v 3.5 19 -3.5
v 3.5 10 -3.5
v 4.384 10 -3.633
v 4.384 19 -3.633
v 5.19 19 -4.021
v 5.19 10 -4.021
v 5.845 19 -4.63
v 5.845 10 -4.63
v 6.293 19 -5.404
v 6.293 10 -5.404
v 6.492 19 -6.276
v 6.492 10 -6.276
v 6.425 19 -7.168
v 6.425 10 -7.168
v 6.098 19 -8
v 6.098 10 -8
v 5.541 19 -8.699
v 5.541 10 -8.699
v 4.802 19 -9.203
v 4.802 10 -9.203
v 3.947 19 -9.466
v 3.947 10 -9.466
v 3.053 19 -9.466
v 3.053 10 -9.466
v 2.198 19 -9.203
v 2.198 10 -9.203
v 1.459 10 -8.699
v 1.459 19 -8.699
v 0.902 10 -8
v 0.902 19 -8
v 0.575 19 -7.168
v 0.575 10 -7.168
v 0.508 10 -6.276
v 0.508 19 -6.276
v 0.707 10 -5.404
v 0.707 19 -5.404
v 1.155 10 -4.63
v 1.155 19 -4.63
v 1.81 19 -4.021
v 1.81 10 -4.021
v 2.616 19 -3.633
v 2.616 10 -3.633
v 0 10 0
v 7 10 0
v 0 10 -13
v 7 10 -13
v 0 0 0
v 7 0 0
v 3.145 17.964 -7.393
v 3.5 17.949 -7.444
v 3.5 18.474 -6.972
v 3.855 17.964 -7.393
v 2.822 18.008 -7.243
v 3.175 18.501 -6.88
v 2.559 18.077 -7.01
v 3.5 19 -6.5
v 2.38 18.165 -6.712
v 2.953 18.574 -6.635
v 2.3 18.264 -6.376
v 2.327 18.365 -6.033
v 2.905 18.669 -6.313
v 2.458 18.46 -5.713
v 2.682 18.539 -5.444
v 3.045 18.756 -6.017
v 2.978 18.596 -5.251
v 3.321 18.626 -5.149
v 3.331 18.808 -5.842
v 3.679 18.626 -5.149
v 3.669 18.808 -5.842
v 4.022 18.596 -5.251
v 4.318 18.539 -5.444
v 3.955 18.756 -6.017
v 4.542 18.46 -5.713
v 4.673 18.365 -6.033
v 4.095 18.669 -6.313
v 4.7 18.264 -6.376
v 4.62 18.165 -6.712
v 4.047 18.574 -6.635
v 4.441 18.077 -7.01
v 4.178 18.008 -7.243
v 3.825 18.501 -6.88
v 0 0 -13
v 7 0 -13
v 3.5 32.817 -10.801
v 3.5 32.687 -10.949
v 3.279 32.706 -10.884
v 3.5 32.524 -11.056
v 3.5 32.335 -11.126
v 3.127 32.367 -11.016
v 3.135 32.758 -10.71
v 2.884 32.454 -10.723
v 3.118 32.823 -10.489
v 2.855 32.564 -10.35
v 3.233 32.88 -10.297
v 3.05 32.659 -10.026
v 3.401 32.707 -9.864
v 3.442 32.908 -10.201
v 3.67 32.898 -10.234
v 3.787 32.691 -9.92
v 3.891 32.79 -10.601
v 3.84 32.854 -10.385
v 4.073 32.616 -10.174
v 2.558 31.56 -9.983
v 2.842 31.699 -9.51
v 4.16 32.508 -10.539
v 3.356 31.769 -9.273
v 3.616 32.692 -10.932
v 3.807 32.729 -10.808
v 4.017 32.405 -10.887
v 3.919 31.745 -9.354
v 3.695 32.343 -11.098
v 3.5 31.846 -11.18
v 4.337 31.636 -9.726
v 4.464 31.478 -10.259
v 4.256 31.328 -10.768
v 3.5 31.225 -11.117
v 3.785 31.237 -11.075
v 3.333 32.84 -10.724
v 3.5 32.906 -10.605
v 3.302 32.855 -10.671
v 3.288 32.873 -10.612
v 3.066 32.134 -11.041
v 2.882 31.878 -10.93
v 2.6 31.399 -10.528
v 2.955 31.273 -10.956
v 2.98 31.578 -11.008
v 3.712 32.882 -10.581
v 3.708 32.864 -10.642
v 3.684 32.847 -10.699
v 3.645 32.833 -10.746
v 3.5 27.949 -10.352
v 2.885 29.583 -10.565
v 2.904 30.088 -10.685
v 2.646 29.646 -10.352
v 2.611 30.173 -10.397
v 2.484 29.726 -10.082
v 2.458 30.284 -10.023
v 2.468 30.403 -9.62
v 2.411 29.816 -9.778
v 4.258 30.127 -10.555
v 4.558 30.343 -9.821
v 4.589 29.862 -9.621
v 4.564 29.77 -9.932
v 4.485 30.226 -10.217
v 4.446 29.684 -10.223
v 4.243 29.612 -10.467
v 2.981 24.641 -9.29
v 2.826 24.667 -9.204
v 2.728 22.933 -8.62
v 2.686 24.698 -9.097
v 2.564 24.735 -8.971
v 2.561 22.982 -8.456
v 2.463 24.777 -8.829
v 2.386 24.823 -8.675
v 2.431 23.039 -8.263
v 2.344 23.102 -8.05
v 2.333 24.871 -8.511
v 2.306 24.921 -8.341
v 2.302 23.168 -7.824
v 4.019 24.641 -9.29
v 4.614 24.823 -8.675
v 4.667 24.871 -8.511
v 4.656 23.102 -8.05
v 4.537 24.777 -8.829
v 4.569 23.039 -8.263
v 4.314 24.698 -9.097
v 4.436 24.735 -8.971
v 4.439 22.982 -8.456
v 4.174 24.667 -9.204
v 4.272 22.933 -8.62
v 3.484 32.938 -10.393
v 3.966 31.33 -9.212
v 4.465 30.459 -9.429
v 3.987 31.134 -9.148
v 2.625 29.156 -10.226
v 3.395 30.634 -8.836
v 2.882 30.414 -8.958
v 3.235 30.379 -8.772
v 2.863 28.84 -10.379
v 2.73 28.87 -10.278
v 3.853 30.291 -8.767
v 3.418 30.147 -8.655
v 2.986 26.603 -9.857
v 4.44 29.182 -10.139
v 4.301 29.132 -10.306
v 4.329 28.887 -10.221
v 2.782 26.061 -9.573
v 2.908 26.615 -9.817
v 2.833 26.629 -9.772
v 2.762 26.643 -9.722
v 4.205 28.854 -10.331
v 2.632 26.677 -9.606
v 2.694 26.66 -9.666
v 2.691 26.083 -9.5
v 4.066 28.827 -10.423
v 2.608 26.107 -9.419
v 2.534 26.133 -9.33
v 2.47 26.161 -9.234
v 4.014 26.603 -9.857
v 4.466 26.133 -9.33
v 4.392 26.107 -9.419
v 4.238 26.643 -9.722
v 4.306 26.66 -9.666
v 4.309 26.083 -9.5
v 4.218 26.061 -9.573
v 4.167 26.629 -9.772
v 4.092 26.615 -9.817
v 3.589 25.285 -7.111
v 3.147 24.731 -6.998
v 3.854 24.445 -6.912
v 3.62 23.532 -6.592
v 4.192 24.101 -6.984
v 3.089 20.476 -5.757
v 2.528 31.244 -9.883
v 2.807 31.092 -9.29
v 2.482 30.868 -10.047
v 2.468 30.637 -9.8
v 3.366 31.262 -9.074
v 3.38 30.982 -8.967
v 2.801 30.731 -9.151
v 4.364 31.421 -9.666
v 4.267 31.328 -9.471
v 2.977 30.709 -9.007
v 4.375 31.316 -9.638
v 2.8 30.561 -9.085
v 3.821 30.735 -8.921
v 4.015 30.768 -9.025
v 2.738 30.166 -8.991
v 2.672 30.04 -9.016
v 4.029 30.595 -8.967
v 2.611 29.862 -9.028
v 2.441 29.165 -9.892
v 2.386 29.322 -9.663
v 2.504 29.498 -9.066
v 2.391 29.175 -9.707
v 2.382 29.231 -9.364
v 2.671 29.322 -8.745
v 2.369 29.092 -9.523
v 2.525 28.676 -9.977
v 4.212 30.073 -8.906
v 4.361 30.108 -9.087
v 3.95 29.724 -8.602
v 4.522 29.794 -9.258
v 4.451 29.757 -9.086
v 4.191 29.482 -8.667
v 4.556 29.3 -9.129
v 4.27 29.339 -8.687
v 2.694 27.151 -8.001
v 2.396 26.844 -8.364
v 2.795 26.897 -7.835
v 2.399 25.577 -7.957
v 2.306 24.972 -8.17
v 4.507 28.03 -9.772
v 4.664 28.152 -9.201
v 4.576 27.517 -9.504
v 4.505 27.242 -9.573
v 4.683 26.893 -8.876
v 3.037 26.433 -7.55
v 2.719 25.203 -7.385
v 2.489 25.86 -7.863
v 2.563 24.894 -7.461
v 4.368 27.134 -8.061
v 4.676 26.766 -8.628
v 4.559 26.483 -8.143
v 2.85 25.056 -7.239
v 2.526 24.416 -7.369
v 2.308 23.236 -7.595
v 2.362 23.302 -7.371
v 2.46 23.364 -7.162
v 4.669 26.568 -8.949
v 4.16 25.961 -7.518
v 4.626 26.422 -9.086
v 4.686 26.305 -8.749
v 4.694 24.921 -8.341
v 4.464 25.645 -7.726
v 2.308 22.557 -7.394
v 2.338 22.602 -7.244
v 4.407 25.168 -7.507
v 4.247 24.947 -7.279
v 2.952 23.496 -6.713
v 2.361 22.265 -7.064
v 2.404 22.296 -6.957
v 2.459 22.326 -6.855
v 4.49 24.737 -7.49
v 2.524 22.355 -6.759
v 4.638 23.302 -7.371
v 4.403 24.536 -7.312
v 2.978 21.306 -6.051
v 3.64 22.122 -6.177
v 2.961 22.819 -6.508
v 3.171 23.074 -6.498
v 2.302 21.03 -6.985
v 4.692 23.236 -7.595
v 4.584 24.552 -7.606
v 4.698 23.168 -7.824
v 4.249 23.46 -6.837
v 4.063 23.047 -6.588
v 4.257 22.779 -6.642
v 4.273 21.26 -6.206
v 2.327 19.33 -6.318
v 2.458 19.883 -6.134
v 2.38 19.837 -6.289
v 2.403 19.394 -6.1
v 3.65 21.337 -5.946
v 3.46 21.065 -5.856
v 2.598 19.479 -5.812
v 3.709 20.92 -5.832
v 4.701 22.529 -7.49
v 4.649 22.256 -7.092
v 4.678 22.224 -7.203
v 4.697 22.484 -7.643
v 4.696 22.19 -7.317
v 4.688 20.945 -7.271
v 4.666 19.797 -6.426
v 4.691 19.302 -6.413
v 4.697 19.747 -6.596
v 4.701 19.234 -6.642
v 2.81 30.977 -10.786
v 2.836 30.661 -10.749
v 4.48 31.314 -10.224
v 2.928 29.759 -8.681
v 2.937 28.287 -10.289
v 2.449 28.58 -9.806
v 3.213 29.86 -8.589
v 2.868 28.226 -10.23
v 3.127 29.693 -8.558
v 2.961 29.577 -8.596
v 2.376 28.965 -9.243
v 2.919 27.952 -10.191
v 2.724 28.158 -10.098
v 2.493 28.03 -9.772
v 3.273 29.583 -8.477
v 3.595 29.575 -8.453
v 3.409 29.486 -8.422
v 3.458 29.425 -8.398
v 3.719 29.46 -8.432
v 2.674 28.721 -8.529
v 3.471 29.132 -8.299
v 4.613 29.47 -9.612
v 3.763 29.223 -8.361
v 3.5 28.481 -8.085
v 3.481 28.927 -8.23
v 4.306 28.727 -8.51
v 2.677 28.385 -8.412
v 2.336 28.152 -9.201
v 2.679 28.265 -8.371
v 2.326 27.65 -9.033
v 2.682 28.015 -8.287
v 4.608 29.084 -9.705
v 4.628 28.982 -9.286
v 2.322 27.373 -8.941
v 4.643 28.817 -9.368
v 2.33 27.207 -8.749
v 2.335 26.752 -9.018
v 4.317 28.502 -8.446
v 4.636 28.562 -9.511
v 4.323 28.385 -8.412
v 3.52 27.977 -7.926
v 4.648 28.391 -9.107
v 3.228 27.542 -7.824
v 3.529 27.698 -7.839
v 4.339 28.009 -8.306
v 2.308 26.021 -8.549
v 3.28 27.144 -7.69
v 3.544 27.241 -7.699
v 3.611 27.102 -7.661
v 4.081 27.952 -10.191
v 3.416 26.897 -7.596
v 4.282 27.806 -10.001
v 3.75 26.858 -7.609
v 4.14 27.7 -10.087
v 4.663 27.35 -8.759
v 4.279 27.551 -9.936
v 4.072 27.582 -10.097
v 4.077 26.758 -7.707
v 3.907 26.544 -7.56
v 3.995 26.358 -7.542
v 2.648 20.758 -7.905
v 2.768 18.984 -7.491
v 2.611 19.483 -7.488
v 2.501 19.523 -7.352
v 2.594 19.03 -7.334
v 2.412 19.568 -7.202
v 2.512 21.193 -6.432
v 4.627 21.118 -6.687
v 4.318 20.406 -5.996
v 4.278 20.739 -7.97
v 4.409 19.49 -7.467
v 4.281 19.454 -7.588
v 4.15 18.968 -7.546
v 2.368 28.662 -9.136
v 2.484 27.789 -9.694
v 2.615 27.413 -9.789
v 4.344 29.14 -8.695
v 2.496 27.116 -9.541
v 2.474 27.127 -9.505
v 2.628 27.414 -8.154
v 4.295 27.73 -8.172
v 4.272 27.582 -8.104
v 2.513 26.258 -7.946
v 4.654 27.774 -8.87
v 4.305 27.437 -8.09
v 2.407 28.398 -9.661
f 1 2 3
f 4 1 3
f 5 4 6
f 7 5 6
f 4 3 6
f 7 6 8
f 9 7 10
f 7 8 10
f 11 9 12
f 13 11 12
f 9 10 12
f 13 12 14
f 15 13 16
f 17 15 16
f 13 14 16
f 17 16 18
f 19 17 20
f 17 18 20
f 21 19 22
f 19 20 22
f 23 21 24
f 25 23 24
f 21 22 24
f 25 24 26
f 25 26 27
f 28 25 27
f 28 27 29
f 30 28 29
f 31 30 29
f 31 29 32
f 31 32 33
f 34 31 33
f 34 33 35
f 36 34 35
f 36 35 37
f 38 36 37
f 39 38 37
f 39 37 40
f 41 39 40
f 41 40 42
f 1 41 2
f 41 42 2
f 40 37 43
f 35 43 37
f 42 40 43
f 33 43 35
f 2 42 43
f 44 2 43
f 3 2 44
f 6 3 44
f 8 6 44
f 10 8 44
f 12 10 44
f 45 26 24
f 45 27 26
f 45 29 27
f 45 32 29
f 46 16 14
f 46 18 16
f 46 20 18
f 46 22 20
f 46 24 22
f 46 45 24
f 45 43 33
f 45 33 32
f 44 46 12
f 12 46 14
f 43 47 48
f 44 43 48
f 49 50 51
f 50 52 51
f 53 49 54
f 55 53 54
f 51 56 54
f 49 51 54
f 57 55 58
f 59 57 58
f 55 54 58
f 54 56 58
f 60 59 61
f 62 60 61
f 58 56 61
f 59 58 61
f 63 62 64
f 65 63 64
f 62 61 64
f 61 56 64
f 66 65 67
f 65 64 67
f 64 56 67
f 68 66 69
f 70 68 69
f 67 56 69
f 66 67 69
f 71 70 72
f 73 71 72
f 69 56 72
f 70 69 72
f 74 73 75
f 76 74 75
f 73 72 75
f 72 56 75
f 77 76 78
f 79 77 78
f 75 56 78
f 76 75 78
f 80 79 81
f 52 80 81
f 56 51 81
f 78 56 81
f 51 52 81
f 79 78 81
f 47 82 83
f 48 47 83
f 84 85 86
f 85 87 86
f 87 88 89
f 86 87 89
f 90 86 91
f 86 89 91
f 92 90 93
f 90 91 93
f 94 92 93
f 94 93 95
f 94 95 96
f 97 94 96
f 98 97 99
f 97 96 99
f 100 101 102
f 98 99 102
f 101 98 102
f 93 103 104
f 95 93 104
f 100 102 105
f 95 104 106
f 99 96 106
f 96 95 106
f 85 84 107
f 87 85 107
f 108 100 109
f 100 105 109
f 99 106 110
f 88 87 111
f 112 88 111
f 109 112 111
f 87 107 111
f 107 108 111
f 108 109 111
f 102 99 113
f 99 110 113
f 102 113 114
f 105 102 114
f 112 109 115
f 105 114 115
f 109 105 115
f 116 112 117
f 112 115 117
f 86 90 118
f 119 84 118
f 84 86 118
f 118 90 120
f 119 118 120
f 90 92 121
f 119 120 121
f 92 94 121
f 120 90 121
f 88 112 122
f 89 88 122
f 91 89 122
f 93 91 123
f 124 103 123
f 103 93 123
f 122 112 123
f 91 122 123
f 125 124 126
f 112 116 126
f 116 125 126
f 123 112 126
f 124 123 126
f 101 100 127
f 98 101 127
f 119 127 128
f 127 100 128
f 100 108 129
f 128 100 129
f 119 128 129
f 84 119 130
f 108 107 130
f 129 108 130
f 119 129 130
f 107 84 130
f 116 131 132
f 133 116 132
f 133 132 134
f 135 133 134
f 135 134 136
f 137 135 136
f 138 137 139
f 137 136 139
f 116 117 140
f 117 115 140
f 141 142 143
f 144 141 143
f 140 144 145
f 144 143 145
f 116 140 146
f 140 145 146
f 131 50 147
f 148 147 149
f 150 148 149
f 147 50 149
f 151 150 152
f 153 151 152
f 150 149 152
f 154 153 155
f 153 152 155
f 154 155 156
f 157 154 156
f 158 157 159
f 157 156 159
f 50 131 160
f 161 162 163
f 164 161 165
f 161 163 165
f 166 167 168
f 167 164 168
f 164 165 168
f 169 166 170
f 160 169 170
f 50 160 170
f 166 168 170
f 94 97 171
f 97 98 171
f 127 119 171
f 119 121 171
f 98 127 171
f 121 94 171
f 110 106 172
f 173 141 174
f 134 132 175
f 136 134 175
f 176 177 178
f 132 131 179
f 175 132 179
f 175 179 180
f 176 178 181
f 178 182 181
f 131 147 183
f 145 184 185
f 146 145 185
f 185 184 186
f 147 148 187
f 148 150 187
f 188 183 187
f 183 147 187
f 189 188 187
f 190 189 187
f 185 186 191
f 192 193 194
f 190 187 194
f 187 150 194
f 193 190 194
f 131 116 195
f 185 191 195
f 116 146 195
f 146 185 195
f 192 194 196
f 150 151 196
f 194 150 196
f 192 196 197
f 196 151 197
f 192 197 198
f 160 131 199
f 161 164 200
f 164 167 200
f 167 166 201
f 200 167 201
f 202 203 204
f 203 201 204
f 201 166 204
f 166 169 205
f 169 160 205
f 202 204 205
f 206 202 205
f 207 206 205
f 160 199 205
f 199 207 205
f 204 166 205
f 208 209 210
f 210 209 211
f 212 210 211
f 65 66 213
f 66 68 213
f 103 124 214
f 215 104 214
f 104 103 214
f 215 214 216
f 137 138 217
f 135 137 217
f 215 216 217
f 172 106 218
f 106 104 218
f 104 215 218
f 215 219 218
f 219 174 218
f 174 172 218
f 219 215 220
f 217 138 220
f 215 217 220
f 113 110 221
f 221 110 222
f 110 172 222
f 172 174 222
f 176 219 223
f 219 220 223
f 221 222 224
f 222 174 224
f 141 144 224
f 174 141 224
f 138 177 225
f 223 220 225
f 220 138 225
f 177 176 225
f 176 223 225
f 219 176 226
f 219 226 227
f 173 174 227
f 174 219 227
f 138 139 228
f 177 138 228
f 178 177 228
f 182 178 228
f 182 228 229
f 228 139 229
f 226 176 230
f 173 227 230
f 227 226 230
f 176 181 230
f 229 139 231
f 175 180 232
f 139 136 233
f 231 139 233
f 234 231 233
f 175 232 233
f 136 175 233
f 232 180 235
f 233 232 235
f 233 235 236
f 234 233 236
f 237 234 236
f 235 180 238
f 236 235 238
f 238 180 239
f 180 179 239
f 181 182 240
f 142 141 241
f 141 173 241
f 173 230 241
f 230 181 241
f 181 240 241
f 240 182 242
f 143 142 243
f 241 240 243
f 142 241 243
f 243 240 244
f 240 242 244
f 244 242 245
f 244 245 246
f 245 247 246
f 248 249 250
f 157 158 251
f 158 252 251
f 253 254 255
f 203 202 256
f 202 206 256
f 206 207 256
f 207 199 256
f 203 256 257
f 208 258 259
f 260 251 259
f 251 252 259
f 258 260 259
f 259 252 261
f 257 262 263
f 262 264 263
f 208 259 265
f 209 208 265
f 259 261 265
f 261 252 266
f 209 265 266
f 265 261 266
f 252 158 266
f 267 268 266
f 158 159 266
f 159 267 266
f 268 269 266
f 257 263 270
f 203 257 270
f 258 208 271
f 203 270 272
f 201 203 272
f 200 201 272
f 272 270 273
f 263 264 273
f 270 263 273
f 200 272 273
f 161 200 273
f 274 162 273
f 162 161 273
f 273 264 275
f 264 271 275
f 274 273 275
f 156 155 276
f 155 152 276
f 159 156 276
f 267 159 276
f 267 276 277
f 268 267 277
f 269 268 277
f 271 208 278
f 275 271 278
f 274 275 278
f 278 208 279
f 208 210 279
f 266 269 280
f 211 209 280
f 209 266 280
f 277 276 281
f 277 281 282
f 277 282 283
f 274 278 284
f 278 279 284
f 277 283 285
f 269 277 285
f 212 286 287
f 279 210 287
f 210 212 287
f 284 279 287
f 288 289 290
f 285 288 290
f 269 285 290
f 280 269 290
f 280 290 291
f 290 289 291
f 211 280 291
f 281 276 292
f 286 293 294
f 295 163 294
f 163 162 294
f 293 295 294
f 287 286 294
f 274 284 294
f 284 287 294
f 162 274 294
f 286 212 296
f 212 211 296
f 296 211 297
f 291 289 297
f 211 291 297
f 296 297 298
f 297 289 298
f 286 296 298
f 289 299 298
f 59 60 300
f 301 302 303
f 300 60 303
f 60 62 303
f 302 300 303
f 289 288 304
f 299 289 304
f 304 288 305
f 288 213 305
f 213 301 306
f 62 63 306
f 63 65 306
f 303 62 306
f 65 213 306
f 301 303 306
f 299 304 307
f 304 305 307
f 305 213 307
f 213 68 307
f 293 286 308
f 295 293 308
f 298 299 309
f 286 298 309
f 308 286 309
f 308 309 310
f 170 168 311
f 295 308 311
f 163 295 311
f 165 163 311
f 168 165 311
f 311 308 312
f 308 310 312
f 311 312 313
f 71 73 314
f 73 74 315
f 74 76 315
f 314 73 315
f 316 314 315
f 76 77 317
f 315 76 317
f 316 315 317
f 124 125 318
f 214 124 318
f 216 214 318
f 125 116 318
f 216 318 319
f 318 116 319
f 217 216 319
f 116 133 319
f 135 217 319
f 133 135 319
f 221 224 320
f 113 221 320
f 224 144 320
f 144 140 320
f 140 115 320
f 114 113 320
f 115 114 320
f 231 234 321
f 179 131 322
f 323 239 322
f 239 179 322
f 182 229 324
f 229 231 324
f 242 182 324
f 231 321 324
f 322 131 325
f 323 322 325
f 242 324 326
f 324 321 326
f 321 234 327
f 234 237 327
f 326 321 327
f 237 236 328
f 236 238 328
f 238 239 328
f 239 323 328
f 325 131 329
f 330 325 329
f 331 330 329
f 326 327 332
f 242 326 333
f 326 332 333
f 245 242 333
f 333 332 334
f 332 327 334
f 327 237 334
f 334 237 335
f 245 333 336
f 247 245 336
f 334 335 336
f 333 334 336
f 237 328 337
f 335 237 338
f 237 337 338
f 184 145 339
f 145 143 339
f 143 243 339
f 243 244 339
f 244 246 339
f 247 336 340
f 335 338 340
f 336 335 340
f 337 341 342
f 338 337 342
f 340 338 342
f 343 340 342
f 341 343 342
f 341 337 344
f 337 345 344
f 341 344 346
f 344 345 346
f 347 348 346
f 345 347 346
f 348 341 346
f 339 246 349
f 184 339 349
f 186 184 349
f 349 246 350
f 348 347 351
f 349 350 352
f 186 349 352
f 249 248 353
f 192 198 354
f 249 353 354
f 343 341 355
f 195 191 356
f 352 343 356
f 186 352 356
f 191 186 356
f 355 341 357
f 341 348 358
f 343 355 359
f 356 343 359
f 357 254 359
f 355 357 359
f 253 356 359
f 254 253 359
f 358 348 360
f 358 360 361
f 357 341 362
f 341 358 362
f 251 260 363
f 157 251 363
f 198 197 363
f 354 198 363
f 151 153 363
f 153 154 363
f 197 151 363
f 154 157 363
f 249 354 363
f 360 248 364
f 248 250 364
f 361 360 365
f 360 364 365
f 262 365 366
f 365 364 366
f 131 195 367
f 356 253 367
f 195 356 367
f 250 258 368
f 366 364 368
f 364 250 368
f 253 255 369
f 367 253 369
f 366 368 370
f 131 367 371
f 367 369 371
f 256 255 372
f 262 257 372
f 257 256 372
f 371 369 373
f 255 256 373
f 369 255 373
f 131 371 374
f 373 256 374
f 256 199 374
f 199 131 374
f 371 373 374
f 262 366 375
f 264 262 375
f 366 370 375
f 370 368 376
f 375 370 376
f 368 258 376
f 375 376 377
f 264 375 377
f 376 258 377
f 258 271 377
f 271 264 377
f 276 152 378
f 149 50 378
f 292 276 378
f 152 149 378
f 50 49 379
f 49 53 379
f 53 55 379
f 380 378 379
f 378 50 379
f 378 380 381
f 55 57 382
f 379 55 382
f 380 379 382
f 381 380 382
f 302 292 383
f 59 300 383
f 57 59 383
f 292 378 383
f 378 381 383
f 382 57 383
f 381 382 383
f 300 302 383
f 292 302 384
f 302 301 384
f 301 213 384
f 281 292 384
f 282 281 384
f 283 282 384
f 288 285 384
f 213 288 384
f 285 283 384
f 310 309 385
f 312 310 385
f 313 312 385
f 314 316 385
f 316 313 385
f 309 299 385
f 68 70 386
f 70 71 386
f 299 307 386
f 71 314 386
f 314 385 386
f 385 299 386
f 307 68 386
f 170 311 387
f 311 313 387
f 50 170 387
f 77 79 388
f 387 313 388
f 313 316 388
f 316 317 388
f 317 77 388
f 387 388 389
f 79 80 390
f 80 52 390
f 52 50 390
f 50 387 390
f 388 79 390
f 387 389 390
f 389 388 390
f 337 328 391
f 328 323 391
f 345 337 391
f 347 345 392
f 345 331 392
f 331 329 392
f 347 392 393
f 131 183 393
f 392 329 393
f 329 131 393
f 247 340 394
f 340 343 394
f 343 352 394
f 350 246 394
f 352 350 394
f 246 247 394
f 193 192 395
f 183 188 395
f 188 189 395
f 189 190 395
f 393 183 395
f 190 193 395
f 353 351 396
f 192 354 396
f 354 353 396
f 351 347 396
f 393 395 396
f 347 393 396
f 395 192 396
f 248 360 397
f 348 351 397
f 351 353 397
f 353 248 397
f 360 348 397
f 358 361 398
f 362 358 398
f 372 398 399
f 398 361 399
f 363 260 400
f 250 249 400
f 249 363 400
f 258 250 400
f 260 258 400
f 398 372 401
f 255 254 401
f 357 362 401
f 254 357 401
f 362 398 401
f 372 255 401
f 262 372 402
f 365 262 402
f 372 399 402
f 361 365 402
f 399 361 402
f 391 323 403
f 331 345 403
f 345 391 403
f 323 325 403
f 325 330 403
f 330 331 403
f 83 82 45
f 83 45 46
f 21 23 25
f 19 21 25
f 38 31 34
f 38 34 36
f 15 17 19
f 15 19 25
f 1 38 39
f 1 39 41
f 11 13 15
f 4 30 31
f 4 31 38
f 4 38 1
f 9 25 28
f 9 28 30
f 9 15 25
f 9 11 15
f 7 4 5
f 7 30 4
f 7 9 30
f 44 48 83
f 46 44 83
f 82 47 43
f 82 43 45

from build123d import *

# Parameters (mm, degrees)
SCHIZZO1_W                   = 7
SCHIZZO1_H                   = 13
ESTRUSIONE_ESTRUSIONE1_DEPTH = 10
SCHIZZO2_R                   = 3
ESTRUSIONE_ESTRUSIONE2_DEPTH = 9


with BuildPart() as part:
    # Schizzo1 → Estrusione-Estrusione1 (new body)
    with BuildSketch(Plane(origin=(0, 0, 0), x_dir=(1, 0, 0), z_dir=(0, 1, 0))):
        with Locations((3.5, 6.5)):
            Rectangle(SCHIZZO1_W, SCHIZZO1_H)
    extrude(amount=ESTRUSIONE_ESTRUSIONE1_DEPTH)

    # Schizzo2 → Estrusione-Estrusione2 (add)
    with BuildSketch(Plane(origin=(0, 10, 0), x_dir=(1, 0, 0), z_dir=(0, 1, 0))):
        with Locations(Location((3.5, 6.5, 0), (0, 0, 270))):
            Circle(SCHIZZO2_R)
    extrude(amount=ESTRUSIONE_ESTRUSIONE2_DEPTH)


with BuildPart() as body_2:
    # Schizzo5 → Rivoluzione1 (revolve)
    with BuildSketch(Plane(origin=(3.5, 0, 0), x_dir=(0, 0, -1), z_dir=(1, 0, 0))):
        with BuildLine():
            Line((6.5, 19), (10.604814586, 32.905769973))
            add(Edge.make_bspline(
                [(10.604814586, 32.905769973), (11.066183218, 32.769579551), (11.279530845, 31.932579848), (10.438498824, 28.112389995), (10.428508858, 28.059361062), (7.443952191, 17.948658713)],
                knots=[0, 0, 0, 0, 0.119714637, 0.219714637, 1, 1, 1, 1], degree=3))
            Line((7.443952191, 17.948658713), (6.5, 19))
        make_face()
    revolve(axis=Axis((3.5, 19, -6.5), (0, 0.9590871798695411, -0.28311089948974166)))


solid = Compound([part.part, body_2.part])
